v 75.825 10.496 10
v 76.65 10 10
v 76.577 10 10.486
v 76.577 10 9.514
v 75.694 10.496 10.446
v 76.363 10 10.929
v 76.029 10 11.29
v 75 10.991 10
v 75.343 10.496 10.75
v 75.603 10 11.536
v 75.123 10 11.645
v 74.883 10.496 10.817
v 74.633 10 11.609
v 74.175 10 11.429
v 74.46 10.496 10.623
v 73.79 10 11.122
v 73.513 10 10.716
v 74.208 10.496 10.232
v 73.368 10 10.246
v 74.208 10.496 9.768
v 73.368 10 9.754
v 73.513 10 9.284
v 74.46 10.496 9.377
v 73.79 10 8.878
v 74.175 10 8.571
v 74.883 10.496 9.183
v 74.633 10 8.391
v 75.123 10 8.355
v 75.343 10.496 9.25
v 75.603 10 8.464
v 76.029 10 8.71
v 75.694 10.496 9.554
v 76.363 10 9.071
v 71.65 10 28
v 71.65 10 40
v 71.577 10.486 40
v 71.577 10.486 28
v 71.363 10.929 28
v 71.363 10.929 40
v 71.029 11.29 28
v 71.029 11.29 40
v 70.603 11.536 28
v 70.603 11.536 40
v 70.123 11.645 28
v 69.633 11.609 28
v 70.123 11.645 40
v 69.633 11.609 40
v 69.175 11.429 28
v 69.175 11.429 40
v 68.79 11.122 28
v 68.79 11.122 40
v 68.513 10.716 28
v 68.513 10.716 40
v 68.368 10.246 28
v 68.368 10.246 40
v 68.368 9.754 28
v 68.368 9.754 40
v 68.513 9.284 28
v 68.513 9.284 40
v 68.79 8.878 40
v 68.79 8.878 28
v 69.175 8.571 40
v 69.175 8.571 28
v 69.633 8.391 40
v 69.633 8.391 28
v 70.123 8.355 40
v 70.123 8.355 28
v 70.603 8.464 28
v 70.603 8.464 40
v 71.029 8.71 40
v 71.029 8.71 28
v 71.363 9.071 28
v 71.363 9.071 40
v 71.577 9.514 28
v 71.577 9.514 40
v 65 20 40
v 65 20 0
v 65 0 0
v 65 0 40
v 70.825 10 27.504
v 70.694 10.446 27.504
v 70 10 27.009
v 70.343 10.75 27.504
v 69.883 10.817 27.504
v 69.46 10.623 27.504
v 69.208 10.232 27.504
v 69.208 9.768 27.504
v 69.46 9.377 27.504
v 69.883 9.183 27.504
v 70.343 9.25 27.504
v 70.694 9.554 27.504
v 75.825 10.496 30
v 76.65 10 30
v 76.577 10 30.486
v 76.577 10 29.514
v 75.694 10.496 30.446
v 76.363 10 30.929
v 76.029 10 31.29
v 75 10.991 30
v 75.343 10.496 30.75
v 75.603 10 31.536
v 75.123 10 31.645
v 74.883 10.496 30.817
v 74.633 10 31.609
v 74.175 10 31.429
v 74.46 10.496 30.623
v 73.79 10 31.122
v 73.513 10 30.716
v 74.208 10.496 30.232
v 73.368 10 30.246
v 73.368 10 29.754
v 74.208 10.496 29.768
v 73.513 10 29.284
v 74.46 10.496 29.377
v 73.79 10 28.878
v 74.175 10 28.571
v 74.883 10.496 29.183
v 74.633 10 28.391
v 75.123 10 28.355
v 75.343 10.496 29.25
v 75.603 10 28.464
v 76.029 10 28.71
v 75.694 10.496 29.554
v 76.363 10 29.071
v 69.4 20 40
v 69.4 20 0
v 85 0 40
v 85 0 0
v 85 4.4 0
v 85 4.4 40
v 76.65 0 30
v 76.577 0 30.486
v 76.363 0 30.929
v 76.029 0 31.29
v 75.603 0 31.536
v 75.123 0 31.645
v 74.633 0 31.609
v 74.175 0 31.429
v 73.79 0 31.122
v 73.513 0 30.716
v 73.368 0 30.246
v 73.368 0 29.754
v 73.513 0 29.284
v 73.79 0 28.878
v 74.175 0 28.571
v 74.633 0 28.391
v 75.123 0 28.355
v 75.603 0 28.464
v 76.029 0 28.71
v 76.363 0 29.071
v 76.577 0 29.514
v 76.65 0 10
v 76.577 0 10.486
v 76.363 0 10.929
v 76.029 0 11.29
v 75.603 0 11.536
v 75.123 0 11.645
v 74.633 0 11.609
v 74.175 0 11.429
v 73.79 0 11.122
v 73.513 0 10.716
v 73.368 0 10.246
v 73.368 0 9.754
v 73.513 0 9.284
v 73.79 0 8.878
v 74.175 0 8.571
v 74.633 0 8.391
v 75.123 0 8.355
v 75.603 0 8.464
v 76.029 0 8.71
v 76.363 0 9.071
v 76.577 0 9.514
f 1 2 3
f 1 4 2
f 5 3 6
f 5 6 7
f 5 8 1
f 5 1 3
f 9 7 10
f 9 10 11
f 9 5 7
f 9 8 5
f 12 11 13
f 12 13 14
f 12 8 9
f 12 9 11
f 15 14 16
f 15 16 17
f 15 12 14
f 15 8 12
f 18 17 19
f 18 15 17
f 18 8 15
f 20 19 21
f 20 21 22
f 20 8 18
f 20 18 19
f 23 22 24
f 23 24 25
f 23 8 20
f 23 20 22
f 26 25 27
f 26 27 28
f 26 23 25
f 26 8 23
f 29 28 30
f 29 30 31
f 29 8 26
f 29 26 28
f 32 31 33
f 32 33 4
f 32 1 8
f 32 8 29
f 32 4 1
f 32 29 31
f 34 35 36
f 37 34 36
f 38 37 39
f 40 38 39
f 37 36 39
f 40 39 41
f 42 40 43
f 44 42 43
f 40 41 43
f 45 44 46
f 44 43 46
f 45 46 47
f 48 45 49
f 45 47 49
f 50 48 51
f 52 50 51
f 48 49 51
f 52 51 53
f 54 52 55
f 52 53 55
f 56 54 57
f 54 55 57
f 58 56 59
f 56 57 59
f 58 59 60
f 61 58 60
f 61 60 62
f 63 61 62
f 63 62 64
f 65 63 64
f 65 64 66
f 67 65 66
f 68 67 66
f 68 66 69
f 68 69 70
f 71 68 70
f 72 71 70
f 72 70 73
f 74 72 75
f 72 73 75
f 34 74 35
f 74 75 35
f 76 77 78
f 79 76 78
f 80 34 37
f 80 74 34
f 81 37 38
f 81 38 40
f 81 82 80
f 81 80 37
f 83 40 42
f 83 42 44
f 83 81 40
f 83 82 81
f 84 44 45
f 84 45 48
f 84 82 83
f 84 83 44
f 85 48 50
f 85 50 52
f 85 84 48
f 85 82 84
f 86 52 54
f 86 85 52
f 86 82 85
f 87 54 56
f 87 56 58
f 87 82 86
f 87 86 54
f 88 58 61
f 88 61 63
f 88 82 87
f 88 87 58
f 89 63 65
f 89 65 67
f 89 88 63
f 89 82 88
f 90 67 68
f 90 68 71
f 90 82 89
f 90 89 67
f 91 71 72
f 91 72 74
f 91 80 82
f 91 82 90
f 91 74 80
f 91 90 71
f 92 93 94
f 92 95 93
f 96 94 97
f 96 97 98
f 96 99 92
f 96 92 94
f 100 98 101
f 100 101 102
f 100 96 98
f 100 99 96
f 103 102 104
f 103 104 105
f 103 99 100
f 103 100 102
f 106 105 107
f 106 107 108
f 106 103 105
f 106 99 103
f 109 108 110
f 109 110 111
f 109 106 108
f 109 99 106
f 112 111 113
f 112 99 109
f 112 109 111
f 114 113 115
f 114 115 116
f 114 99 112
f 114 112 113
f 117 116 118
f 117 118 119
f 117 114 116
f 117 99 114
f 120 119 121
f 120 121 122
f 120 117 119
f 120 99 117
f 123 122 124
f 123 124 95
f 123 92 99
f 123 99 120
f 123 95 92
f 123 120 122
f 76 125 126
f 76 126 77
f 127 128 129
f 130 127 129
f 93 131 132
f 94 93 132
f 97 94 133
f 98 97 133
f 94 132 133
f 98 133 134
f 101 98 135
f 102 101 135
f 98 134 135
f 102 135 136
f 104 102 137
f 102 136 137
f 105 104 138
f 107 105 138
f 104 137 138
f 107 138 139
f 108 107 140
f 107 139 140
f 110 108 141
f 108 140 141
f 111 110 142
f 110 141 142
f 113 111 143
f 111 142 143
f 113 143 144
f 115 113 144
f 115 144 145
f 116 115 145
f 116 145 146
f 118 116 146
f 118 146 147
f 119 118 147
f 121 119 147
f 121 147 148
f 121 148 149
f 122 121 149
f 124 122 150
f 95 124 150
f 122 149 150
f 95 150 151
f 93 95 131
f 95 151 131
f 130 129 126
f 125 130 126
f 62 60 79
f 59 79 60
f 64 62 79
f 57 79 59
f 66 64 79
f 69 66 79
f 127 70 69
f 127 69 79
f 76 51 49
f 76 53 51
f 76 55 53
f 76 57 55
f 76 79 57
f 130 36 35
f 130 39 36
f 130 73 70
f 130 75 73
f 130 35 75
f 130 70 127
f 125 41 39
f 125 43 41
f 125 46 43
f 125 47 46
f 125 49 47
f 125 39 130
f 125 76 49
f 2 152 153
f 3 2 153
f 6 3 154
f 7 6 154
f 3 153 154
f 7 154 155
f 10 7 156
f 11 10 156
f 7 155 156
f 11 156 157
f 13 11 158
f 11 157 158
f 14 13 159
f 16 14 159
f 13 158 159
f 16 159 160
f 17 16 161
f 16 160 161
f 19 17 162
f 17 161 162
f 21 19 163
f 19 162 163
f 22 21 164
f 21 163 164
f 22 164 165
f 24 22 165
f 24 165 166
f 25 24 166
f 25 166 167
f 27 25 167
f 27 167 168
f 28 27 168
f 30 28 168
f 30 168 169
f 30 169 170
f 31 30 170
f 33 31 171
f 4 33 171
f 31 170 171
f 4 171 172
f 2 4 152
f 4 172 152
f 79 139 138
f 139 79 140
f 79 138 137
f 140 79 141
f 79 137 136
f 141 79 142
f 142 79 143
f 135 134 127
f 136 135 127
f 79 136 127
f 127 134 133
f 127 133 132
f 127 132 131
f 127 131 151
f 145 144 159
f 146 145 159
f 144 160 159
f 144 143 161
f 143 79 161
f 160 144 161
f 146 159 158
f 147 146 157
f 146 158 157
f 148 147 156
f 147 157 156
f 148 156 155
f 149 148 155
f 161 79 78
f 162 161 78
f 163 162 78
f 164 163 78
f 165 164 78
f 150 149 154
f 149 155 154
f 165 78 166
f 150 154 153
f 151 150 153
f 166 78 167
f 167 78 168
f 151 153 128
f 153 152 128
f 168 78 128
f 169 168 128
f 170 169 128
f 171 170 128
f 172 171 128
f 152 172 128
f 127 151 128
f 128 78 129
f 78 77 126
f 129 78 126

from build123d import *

# Parameters (mm, degrees)
PAD_DEPTH      = 40
SKETCH001_R    = 1.65
HOLE_DEPTH     = 10
HOLE_TIPS_R    = 1.65
SKETCH002_R    = 1.65
HOLE001_DEPTH  = 12
HOLE001_TIPS_R = 1.65


with BuildPart() as part:
    # Sketch → Pad (new body)
    with BuildSketch(Plane.XY):
        Polygon((65, 0), (85, 0), (85, 4.4), (69.4, 20), (65, 20), align=None)
    extrude(amount=PAD_DEPTH)

    # Sketch001 (on Face1 of Pad) → Hole (cut)
    with BuildSketch(Plane.XZ):
        with Locations((75, 30)):
            Circle(SKETCH001_R)
        with Locations((75, 10)):
            Circle(SKETCH001_R)
    extrude(amount=-HOLE_DEPTH, mode=Mode.SUBTRACT)

    # Hole tips → Hole tip 1 section 0
    with BuildSketch(Plane.XZ.offset(-10), mode=Mode.PRIVATE) as hole_tip_1_s0:
        with Locations((75, 30)):
            Circle(HOLE_TIPS_R)
    loft([hole_tip_1_s0.sketch, Vertex(75, 10.99142, 30)], mode=Mode.SUBTRACT)

    # Hole tips → Hole tip 2 section 0
    with BuildSketch(Plane.XZ.offset(-10), mode=Mode.PRIVATE) as hole_tip_2_s0:
        with Locations((75, 10)):
            Circle(HOLE_TIPS_R)
    loft([hole_tip_2_s0.sketch, Vertex(75, 10.99142, 10)], mode=Mode.SUBTRACT)

    # Sketch002 (on Face4 of Hole) → Hole001 (cut)
    with BuildSketch(Plane.XY.offset(40)):
        with Locations((70, 10)):
            Circle(SKETCH002_R)
    extrude(amount=-HOLE001_DEPTH, mode=Mode.SUBTRACT)

    # Hole001 tips → Hole001 tip 1 section 0
    with BuildSketch(Plane.XY.offset(28), mode=Mode.PRIVATE) as hole001_tip_1_s0:
        with Locations((70, 10)):
            Circle(HOLE001_TIPS_R)
    loft([hole001_tip_1_s0.sketch, Vertex(70, 10, 27.00858)], mode=Mode.SUBTRACT)


solid = part.part
